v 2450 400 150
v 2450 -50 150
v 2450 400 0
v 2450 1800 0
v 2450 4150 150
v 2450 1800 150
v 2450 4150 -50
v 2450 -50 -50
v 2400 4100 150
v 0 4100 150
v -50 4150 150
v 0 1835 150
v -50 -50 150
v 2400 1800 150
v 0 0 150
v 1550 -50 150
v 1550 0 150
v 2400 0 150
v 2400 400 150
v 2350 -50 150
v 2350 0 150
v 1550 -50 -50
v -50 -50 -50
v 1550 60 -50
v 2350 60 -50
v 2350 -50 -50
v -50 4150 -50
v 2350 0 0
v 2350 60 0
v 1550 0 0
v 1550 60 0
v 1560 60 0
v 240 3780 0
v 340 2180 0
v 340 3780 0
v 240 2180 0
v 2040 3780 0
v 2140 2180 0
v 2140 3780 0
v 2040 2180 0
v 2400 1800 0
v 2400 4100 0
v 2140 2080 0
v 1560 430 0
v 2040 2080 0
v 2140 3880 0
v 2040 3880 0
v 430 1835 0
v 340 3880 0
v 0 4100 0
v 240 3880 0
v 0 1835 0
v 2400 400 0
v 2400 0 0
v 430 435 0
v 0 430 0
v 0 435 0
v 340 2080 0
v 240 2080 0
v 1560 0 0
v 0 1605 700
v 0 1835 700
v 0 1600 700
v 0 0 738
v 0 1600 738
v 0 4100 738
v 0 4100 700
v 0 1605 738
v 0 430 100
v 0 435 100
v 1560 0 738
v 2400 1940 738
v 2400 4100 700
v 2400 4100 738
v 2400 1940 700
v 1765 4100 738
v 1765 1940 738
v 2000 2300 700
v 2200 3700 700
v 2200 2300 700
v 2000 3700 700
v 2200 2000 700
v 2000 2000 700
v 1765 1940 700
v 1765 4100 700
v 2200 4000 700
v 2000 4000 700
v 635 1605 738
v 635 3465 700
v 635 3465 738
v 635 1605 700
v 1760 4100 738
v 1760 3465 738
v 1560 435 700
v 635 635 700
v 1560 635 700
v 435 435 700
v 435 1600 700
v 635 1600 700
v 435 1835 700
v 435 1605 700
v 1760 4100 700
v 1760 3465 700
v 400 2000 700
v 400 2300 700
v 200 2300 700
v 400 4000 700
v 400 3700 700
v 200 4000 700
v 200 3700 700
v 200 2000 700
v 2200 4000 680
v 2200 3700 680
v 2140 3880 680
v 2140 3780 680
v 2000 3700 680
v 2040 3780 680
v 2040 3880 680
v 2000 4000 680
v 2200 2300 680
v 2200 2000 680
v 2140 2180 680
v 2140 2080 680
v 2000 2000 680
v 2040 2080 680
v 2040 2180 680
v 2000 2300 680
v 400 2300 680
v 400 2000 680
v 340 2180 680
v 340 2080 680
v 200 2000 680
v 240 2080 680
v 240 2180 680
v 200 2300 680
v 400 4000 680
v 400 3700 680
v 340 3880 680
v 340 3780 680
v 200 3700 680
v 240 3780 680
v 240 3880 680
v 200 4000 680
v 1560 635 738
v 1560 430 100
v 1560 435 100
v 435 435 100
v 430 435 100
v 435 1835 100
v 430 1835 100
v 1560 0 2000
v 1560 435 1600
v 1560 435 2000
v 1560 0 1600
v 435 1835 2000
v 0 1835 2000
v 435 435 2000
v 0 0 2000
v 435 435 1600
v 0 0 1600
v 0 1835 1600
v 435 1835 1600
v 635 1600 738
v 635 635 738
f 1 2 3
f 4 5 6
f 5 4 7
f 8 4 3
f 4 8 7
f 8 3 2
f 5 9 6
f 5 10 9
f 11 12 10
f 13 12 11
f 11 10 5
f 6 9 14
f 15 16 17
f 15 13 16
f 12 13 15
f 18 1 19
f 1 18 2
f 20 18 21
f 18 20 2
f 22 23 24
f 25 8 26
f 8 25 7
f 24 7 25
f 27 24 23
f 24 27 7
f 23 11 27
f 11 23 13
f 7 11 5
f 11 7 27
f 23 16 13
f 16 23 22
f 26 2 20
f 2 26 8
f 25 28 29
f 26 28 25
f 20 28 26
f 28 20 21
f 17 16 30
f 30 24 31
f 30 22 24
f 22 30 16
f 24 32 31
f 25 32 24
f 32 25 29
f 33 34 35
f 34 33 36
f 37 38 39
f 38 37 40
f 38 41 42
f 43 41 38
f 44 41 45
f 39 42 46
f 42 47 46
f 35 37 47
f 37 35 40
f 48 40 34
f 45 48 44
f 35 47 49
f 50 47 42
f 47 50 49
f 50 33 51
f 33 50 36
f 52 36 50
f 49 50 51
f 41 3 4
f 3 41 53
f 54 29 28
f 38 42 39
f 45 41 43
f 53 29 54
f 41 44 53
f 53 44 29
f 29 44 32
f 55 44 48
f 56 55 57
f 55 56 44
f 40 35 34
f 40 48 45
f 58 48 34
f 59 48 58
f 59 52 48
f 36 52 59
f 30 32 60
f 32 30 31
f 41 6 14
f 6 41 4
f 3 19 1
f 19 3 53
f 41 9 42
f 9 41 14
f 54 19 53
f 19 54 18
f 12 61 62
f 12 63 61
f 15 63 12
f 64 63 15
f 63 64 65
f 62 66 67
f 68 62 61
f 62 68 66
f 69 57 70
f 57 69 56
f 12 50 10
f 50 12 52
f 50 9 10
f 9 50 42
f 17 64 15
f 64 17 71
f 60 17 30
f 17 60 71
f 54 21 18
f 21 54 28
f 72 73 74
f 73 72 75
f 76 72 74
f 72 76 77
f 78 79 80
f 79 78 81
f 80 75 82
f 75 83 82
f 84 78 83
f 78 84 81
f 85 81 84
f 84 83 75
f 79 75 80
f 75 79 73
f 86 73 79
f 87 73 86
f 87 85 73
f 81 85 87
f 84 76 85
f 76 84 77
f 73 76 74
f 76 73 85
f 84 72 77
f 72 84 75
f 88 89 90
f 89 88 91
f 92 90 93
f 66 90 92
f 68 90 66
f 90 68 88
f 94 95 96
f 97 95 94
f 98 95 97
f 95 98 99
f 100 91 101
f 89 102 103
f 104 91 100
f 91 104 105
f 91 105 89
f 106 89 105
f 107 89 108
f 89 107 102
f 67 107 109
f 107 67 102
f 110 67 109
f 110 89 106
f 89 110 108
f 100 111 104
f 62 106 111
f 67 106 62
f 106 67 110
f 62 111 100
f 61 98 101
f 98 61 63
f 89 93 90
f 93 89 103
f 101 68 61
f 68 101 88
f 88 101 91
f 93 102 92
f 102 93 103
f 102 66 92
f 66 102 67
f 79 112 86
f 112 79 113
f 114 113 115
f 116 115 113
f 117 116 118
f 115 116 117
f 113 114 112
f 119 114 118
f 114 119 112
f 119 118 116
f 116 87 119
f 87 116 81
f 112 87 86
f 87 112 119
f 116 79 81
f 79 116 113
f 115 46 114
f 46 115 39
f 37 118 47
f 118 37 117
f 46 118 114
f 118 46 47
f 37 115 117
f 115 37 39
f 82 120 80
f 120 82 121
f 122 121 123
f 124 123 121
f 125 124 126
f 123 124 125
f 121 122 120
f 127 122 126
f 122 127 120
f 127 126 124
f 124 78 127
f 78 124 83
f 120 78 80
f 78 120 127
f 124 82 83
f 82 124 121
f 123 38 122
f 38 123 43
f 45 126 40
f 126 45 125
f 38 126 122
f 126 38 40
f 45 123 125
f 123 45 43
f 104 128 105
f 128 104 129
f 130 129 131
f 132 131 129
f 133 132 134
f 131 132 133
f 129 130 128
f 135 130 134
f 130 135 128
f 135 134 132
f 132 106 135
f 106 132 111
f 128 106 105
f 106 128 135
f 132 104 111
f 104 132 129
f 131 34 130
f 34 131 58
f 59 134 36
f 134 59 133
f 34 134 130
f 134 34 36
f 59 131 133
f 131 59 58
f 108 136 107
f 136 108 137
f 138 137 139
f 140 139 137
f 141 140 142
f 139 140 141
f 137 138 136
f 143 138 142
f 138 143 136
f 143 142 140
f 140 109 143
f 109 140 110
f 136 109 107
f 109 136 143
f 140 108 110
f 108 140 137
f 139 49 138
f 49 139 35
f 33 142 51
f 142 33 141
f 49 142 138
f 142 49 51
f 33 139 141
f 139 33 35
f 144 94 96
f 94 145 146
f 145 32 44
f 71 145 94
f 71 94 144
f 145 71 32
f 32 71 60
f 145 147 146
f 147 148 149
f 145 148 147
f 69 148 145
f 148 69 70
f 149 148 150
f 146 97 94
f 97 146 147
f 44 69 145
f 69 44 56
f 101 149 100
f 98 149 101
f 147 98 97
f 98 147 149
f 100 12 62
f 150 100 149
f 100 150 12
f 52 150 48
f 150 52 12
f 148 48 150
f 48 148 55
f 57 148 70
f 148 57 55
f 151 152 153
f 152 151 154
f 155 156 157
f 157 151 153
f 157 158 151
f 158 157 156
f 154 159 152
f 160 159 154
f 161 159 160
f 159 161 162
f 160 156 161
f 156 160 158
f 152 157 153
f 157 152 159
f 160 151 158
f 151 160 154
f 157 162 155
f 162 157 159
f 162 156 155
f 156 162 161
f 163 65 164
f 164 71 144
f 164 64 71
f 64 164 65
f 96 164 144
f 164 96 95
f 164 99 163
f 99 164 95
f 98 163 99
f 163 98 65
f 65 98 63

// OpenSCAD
wbH = 700;
cbH = 600;
tcbH = 400;
roomWidth = 2400;
roomLength = 4100;
wbLength = 1860;
wbWidth = 635;
wbHeight = 38;

module room() {
	difference() {
		translate([-50, -50, -50]) {
			color("LightGrey",0.5) cube([roomWidth + 100, roomLength + 100, 200], center = false);
		}
		
		translate([-50 + 2400 - 800 , -50, -50]) {
			color("LightGrey",0.5) cube([800, 110, 2100], center = false);			
		}

		translate([2349, 400, 0]) {
			color("LightGrey",0.5) cube([110, 1400, 2100], center = false);			
		}

		color("LightGrey",0.5) cube([roomWidth, roomLength, 2100], center = false);
	}
}

module desk() {
	// Computer
	translate([roomWidth - wbWidth, roomLength-wbLength, 700]) {
		color("BurlyWood", 1.0) cube([wbWidth, wbLength, wbHeight]);
	}

	// Printer
	translate([roomWidth - wbWidth, roomLength-wbLength-300, 700]) {
		color("BurlyWood", 1.0) cube([wbWidth, 300, wbHeight]);
	}

	// Electronics
	translate([0, roomLength-wbLength - wbWidth, 700]) {
		color("BurlyWood", 1.0) cube([wbWidth, wbLength, wbHeight]);
	}

	// Divider
	translate([0, roomLength - wbWidth, 700]) {
		color("BurlyWood", 1.0) cube([wbLength - 100, wbWidth, wbHeight]);
	}
}

module workbench() {
	translate([0, 0, wbH]) {
		color("BurlyWood", 1.0) cube([wbLength - 300, wbWidth, wbHeight]);
	}

	translate([0, wbWidth, wbH]) {
		color("BurlyWood", 1.0) cube([wbWidth, wbLength - 895, wbHeight]);
	}
}

module bottom_cabins() {	
	translate([0, 0, 100]) {
		color("white", 1.0) cube([wbLength - 300, 435, cbH]);
	}

	// Sockel
	translate([0, 0, 0]) {
		color("lightgrey", 1.0) cube([wbLength - 300, 430, 100]);
	}

	translate([0, 435, 100]) {
		color("white", 1.0) cube([435, wbLength - 460, cbH]);
	}

	// Sockel
	translate([0, 435, 0]) {
		color("lightgrey", 1.0) cube([430, wbLength - 460, 100]);
	}
}

module top_cabins() {	
	translate([0, 0, 1600]) {
		color("white", 1.0) cube([wbLength - 300, 435, tcbH]);
	}

	translate([0, 435, 1600]) {
		color("white", 1.0) cube([435, wbLength - 460, tcbH]);
	}	
}

module legs() {
	translate([0,0,680]) {
		cube([200,300,20]);
	}

	translate([40,80,0]) {
		cube([100,100,680]);
	}
}

room();
desk();
translate([2000, 3700,0]) legs();
translate([2000, 2000,0]) legs();
translate([200, 2000,0]) legs();
translate([200, 3700,0]) legs();
bottom_cabins();
top_cabins();
workbench();
